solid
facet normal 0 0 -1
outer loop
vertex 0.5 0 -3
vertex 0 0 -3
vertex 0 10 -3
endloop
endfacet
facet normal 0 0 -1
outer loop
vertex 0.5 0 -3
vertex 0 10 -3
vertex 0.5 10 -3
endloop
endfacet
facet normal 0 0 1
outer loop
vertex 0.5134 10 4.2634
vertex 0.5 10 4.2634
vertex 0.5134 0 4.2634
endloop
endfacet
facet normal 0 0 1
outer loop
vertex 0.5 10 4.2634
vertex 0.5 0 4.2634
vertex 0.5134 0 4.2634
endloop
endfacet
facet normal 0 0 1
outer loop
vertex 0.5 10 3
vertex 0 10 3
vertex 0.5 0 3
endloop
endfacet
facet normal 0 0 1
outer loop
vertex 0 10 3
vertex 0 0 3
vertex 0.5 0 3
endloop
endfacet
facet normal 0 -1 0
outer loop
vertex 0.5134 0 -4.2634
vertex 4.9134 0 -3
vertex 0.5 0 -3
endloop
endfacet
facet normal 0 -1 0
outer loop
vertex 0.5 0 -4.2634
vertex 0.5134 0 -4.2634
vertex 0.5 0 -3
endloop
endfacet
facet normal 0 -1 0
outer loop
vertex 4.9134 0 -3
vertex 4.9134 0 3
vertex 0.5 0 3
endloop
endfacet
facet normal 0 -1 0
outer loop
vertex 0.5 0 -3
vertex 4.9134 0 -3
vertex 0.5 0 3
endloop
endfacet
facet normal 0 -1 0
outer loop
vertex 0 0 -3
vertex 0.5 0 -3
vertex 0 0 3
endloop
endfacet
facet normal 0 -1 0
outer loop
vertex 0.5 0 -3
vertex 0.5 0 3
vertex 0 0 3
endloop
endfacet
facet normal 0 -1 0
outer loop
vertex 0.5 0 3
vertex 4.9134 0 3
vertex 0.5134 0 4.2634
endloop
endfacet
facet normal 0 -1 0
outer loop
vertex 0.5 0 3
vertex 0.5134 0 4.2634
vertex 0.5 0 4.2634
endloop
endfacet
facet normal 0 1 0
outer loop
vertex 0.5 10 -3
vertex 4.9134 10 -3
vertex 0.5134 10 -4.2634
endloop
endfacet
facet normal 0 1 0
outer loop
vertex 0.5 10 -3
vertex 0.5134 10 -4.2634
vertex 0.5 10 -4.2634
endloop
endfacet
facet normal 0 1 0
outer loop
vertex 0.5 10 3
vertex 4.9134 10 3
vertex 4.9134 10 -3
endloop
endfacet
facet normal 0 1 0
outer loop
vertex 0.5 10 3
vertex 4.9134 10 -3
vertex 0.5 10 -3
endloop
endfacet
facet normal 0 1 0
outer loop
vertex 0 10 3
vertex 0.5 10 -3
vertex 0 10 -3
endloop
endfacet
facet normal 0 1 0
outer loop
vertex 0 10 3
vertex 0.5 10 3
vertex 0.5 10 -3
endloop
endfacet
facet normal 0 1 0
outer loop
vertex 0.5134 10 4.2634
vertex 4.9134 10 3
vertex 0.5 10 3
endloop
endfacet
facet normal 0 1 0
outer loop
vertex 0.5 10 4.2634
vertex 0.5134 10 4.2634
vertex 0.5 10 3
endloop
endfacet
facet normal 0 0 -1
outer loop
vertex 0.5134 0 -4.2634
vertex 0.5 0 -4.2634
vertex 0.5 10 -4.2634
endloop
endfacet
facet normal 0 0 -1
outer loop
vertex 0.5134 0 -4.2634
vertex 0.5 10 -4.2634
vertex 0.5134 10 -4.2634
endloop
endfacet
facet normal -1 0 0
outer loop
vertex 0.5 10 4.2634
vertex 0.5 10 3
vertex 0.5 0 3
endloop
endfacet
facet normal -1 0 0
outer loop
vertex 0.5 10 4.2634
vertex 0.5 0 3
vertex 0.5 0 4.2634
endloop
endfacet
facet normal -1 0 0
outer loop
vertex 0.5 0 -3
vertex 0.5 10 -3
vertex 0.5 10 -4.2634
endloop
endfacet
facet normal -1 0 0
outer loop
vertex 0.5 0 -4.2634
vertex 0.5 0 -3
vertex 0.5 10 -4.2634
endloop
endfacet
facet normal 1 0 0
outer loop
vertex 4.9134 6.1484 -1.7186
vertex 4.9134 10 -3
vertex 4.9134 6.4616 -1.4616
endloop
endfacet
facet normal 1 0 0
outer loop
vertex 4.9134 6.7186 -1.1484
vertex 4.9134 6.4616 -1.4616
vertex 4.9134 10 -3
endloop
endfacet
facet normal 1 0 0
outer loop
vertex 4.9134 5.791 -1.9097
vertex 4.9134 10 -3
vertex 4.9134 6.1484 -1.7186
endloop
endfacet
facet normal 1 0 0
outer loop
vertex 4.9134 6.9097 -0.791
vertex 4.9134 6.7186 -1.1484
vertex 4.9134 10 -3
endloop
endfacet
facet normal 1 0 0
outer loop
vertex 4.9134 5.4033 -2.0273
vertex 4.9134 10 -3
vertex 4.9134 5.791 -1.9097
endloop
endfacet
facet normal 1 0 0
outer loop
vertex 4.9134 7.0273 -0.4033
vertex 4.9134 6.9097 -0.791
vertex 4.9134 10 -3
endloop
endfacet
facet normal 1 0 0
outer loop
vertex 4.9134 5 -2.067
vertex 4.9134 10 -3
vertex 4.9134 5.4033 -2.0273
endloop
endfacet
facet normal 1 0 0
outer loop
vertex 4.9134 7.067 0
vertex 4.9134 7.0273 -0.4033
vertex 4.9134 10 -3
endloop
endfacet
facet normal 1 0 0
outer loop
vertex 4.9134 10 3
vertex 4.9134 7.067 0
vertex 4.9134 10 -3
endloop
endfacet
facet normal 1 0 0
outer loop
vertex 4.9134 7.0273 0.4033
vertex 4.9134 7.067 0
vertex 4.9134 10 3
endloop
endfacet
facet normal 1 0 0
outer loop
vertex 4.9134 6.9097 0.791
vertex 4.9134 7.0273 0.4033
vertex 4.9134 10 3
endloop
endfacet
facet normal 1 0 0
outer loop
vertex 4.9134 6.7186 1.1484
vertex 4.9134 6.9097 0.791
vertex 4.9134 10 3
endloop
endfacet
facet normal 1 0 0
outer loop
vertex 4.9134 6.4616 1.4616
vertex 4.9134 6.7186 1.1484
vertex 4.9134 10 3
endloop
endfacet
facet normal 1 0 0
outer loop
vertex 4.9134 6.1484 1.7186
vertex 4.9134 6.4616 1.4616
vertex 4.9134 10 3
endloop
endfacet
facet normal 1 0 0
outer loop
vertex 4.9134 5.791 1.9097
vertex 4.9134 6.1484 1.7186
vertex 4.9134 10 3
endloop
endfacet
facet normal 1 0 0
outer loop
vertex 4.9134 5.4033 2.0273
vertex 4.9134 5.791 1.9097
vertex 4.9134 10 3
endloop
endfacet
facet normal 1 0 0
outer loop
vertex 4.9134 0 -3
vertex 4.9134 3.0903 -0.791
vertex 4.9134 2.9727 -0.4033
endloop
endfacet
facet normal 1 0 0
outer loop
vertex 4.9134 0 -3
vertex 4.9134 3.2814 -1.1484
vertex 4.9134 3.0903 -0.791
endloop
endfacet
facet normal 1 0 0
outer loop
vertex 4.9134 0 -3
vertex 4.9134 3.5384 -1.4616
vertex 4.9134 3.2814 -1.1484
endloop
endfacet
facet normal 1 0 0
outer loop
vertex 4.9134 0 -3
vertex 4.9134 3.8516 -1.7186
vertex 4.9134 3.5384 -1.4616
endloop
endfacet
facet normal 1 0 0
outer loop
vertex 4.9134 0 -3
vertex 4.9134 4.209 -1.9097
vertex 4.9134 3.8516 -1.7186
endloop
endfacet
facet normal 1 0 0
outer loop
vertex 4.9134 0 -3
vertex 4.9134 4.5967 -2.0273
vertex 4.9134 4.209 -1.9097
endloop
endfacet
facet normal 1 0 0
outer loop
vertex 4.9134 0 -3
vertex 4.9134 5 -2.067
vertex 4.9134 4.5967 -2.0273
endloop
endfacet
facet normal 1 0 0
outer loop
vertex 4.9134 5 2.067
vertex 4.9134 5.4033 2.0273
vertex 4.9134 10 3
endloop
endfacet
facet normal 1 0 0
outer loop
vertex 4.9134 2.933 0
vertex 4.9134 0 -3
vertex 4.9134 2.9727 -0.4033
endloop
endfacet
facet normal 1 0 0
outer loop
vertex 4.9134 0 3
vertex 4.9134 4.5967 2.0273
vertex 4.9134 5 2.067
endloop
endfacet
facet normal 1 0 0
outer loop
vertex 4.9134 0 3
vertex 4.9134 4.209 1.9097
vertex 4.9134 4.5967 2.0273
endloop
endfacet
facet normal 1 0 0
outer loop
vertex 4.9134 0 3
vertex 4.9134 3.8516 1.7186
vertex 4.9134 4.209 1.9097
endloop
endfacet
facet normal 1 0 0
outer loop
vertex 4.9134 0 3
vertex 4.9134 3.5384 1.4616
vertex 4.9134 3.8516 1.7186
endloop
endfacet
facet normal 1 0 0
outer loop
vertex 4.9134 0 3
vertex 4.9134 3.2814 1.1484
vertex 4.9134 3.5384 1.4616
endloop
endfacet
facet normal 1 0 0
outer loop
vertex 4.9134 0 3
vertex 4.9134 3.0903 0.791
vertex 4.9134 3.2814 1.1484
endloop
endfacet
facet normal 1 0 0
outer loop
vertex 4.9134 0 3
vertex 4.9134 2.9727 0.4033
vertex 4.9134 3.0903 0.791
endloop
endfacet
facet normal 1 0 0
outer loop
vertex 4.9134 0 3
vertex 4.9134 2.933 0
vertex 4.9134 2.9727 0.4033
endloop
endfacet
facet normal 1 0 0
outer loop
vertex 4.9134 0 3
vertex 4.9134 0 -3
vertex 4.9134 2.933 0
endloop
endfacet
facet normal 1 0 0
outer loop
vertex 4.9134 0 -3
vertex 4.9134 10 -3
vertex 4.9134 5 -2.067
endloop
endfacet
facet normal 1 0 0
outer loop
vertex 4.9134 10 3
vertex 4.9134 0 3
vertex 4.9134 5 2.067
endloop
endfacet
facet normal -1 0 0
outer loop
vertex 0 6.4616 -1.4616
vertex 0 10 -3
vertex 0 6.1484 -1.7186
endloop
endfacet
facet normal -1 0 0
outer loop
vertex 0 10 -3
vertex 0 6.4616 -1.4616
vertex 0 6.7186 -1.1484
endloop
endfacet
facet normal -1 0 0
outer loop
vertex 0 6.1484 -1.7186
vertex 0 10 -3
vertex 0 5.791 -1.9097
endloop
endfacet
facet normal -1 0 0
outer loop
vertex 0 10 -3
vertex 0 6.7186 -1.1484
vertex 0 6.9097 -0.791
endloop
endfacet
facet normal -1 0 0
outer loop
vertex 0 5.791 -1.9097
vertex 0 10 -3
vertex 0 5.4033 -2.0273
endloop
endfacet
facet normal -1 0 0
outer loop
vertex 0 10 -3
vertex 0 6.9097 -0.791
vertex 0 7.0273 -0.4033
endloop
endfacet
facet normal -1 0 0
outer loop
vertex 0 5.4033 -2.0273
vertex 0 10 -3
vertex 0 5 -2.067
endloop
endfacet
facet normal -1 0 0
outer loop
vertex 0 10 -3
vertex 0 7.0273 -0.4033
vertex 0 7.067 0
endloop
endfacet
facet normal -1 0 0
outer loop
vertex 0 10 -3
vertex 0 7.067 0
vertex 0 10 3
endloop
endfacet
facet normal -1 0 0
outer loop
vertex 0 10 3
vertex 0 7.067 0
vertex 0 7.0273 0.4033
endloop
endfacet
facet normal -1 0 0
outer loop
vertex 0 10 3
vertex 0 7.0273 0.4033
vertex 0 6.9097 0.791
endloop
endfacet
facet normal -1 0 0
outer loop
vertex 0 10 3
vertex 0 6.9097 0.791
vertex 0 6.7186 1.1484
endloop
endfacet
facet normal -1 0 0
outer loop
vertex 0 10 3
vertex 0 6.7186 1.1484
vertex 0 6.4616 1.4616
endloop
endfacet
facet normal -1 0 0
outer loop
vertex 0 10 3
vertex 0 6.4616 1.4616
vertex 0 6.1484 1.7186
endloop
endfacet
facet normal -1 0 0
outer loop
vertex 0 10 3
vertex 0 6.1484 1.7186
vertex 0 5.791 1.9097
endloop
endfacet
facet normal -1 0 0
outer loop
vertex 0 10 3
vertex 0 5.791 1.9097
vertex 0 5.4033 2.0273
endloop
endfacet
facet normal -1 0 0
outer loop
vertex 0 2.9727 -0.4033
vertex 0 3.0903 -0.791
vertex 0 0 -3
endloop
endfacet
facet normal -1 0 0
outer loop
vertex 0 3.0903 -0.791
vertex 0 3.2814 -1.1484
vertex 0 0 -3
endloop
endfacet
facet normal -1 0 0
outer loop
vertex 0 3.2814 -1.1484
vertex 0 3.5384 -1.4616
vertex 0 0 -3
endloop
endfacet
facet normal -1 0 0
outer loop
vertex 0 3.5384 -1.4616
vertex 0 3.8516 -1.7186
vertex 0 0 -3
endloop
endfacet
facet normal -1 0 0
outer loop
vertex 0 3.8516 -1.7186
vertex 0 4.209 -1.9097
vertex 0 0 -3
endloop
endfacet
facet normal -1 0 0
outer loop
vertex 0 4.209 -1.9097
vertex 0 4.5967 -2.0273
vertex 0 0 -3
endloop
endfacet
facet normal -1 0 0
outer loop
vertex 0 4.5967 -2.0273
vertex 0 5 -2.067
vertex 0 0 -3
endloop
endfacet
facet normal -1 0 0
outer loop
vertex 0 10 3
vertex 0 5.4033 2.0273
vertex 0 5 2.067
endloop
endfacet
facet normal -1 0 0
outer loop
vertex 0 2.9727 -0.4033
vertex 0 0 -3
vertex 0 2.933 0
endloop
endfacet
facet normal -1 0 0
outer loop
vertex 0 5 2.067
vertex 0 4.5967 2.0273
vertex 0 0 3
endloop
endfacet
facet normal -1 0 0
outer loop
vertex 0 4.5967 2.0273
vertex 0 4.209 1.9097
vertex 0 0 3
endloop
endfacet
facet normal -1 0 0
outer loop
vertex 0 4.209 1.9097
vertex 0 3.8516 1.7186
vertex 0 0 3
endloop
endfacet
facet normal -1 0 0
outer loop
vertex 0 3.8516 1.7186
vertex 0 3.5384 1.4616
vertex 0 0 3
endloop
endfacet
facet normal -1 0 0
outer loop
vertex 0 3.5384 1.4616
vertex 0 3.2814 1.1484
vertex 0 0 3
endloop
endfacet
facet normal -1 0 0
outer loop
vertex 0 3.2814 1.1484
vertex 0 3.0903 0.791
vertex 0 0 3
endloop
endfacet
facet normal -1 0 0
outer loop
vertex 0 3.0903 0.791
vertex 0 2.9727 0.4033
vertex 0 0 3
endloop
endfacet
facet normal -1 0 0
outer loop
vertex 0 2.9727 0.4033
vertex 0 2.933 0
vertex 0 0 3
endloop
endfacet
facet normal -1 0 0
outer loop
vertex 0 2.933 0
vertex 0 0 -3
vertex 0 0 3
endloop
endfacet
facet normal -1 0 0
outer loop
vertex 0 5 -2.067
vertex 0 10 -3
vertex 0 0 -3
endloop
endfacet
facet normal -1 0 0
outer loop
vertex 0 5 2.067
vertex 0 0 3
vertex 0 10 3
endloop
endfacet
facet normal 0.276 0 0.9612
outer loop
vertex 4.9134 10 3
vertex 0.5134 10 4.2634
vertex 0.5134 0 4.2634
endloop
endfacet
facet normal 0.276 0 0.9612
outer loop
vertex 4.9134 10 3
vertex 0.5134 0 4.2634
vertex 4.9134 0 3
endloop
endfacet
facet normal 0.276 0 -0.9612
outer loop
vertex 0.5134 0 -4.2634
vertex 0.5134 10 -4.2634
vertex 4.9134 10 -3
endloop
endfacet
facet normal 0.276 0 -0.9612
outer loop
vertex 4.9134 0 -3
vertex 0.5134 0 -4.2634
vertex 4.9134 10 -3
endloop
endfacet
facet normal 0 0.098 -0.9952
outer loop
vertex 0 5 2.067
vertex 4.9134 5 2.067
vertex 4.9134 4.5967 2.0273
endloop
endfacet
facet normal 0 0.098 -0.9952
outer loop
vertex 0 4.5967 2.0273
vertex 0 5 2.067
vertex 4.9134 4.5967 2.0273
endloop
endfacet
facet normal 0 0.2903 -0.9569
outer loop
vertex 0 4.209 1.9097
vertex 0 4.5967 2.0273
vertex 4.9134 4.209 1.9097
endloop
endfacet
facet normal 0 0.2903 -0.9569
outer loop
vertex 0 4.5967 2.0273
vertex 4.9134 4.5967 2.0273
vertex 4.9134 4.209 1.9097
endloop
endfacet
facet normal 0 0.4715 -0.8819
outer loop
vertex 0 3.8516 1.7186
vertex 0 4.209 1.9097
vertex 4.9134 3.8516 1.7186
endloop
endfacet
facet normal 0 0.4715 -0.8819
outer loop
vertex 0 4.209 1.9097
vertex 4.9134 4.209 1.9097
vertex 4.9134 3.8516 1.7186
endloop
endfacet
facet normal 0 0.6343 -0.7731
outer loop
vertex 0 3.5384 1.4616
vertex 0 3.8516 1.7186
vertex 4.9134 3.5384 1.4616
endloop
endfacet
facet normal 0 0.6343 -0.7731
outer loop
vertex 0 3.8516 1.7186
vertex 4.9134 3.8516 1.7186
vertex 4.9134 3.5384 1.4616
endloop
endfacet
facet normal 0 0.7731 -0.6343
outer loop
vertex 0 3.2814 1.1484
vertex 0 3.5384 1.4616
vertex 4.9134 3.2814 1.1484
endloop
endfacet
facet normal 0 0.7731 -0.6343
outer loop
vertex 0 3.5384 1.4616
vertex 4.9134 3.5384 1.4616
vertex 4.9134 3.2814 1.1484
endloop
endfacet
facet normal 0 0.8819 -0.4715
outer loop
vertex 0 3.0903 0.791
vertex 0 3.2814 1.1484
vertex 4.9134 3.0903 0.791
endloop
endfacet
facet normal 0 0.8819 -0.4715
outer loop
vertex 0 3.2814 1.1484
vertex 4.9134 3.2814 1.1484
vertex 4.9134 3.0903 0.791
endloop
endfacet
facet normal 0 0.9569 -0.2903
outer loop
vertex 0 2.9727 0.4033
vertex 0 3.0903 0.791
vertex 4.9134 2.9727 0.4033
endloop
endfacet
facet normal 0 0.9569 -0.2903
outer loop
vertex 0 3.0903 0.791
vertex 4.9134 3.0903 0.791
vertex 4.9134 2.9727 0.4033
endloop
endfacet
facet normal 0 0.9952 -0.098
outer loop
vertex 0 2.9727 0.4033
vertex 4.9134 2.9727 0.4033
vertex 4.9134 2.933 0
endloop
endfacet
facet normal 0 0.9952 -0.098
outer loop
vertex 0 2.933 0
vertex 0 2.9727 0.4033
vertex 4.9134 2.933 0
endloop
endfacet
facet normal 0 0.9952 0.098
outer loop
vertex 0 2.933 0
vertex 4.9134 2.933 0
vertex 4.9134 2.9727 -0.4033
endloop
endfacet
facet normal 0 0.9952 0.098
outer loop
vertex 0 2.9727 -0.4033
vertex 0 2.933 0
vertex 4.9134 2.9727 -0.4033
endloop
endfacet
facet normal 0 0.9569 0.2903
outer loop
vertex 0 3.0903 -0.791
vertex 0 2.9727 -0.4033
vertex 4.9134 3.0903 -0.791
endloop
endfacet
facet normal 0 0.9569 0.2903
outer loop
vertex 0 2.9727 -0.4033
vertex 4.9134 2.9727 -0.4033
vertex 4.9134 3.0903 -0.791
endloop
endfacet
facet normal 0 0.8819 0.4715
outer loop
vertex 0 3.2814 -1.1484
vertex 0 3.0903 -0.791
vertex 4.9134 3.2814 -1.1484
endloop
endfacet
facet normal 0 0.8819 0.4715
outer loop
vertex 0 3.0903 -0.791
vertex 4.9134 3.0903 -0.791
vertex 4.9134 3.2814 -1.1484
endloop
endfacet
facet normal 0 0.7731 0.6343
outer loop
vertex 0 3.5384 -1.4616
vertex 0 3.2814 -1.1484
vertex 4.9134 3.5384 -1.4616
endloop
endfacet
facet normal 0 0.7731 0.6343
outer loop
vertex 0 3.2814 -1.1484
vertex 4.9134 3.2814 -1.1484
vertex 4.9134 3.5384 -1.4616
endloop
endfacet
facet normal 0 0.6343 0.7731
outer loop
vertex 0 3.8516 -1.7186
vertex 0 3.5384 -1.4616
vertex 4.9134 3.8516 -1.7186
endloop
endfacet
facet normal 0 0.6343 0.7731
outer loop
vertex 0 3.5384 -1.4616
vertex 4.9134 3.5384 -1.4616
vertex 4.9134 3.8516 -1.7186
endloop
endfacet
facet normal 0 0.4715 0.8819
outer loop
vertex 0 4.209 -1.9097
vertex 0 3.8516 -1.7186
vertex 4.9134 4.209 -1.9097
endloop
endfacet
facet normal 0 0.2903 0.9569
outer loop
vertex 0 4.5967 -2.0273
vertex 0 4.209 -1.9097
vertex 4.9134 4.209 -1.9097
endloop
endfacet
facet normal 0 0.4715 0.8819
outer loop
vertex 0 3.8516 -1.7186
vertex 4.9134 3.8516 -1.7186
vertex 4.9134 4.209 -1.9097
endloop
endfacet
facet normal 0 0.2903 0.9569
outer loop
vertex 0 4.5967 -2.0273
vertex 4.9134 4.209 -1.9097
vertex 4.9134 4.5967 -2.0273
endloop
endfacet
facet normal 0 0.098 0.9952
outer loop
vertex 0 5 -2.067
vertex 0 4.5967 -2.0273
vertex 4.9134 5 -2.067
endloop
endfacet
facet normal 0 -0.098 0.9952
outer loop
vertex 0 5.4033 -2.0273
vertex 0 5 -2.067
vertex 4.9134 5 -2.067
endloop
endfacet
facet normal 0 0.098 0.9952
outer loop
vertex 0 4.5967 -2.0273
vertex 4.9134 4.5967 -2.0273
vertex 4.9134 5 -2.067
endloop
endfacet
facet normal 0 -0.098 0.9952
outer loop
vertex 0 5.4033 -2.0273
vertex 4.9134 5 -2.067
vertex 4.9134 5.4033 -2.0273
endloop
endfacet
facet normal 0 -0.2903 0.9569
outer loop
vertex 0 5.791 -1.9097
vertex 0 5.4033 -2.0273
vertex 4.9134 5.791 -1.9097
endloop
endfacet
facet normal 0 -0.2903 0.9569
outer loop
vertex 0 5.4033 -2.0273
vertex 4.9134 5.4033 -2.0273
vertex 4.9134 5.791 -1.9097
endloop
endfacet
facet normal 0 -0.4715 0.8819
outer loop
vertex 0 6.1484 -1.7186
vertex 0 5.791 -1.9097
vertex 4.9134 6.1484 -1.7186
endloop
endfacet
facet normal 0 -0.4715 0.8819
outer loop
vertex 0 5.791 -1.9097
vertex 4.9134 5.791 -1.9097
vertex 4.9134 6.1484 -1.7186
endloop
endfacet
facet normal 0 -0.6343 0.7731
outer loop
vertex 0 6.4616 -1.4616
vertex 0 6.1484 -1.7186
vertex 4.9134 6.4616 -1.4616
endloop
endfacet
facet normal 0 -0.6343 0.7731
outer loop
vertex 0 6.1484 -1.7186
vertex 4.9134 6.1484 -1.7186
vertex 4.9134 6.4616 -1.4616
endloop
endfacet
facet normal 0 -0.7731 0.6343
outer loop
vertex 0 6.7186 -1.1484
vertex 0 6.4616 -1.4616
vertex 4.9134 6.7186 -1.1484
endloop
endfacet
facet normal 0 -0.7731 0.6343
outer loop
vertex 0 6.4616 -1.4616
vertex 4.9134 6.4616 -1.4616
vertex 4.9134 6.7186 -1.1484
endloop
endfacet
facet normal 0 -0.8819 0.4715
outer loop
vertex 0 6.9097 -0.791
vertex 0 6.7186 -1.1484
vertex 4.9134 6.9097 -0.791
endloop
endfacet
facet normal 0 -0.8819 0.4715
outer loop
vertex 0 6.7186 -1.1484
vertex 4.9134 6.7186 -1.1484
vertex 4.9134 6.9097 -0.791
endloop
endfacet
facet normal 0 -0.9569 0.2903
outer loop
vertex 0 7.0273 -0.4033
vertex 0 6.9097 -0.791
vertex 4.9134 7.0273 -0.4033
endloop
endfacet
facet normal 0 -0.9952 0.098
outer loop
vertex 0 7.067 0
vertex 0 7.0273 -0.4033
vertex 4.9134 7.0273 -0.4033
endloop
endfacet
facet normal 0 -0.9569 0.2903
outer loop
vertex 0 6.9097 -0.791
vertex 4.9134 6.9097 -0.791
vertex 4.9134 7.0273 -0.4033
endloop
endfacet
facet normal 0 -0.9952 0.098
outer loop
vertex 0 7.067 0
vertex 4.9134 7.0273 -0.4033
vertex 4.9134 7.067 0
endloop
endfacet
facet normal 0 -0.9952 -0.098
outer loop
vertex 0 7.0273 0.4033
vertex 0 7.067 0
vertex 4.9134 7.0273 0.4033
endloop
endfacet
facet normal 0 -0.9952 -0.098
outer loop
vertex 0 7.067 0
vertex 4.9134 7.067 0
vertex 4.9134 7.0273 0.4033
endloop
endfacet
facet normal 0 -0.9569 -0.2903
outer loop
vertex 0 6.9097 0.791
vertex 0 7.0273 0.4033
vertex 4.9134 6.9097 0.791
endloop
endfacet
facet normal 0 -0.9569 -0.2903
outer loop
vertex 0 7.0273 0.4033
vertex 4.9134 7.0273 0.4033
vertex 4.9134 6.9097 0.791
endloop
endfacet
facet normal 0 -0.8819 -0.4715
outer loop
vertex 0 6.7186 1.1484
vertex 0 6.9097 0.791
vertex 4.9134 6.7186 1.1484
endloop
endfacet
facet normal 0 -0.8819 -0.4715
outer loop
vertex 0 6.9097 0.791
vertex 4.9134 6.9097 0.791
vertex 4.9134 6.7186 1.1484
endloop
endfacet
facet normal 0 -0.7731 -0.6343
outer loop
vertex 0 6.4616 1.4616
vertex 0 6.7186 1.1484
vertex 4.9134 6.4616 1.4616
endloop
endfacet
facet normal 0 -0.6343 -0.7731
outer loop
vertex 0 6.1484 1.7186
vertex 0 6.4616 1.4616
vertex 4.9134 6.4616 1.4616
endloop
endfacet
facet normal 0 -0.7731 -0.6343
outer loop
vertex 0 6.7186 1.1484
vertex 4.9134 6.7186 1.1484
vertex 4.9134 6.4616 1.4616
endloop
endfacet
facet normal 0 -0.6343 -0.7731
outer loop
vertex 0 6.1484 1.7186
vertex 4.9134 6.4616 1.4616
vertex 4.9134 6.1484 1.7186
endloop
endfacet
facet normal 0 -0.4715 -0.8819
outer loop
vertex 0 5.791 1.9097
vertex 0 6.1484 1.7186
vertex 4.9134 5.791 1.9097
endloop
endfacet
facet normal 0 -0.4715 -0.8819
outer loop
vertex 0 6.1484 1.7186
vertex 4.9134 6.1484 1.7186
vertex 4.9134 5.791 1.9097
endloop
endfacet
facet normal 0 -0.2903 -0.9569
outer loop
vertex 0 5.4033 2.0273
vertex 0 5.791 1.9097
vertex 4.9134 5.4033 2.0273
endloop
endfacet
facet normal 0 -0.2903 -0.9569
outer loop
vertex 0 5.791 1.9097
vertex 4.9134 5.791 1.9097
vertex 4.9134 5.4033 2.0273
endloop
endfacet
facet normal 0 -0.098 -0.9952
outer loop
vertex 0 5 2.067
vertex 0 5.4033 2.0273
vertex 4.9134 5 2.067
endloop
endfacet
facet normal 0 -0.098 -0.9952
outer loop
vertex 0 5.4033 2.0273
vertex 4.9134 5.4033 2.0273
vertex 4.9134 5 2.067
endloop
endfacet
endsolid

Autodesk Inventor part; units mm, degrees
ref_plane "YZ Plane" through (0, 0, 0) normal (1, 0, 0) x (0, 1, 0)
ref_plane "XZ Plane" through (0, 0, 0) normal (0, 1, 0) x (-1, 0, 0)
ref_plane "XY Plane" through (0, 0, 0) normal (0, 0, 1) x (1, 0, 0)
sketch "Sketch1" plane through (0, 0, 0) normal (0, 1, 0) x (-1, 0, 0)
  line L0 (0, -3) -> (-0.5, -3)
  line L1 (-0.5, -3) -> (-0.5, -4.2634)
  line L2 (-0.5, -4.2634) -> (-0.5134, -4.2634)
  line L3 (-0.5134, -4.2634) -> (-4.9134, -3)
  line L4 (0, -3) -> (0, 0)
  line L5 (-4.9134, -3) -> (-4.9134, 0)
  line L6 (0, 0) -> (-4.9134, 0) construction
  line L7 (0, 3) -> (-0.5, 3)
  line L8 (-0.5, 3) -> (-0.5, 4.2634)
  line L9 (-0.5, 4.2634) -> (-0.5134, 4.2634)
  line L10 (-0.5134, 4.2634) -> (-4.9134, 3)
  line L11 (0, 3) -> (0, 0)
  line L12 (-4.9134, 3) -> (-4.9134, 0)
  dimension "d0" = 6
  dimension "d1" = 0.5
  dimension "d4" = 4.4
extrude "Extrusion1" add sketch "Sketch1" along normal blind 10
sketch "Sketch2" plane through (0, 0, -3) normal (-1, 0, 0) x (0, 0, 1)
  line L0 (3, 0) -> (3, 10) construction
  line L1 (0, 10) -> (6, 10) projected
  point P0 (3, 5)
hole "Hole2" at (0, 5, 0) direction (1, 0, 0) diameter 4.134 end through all thread size "M5x0.8" class "6H" standard "ISO Metric profile"
properties part number "m5_t_nut"
